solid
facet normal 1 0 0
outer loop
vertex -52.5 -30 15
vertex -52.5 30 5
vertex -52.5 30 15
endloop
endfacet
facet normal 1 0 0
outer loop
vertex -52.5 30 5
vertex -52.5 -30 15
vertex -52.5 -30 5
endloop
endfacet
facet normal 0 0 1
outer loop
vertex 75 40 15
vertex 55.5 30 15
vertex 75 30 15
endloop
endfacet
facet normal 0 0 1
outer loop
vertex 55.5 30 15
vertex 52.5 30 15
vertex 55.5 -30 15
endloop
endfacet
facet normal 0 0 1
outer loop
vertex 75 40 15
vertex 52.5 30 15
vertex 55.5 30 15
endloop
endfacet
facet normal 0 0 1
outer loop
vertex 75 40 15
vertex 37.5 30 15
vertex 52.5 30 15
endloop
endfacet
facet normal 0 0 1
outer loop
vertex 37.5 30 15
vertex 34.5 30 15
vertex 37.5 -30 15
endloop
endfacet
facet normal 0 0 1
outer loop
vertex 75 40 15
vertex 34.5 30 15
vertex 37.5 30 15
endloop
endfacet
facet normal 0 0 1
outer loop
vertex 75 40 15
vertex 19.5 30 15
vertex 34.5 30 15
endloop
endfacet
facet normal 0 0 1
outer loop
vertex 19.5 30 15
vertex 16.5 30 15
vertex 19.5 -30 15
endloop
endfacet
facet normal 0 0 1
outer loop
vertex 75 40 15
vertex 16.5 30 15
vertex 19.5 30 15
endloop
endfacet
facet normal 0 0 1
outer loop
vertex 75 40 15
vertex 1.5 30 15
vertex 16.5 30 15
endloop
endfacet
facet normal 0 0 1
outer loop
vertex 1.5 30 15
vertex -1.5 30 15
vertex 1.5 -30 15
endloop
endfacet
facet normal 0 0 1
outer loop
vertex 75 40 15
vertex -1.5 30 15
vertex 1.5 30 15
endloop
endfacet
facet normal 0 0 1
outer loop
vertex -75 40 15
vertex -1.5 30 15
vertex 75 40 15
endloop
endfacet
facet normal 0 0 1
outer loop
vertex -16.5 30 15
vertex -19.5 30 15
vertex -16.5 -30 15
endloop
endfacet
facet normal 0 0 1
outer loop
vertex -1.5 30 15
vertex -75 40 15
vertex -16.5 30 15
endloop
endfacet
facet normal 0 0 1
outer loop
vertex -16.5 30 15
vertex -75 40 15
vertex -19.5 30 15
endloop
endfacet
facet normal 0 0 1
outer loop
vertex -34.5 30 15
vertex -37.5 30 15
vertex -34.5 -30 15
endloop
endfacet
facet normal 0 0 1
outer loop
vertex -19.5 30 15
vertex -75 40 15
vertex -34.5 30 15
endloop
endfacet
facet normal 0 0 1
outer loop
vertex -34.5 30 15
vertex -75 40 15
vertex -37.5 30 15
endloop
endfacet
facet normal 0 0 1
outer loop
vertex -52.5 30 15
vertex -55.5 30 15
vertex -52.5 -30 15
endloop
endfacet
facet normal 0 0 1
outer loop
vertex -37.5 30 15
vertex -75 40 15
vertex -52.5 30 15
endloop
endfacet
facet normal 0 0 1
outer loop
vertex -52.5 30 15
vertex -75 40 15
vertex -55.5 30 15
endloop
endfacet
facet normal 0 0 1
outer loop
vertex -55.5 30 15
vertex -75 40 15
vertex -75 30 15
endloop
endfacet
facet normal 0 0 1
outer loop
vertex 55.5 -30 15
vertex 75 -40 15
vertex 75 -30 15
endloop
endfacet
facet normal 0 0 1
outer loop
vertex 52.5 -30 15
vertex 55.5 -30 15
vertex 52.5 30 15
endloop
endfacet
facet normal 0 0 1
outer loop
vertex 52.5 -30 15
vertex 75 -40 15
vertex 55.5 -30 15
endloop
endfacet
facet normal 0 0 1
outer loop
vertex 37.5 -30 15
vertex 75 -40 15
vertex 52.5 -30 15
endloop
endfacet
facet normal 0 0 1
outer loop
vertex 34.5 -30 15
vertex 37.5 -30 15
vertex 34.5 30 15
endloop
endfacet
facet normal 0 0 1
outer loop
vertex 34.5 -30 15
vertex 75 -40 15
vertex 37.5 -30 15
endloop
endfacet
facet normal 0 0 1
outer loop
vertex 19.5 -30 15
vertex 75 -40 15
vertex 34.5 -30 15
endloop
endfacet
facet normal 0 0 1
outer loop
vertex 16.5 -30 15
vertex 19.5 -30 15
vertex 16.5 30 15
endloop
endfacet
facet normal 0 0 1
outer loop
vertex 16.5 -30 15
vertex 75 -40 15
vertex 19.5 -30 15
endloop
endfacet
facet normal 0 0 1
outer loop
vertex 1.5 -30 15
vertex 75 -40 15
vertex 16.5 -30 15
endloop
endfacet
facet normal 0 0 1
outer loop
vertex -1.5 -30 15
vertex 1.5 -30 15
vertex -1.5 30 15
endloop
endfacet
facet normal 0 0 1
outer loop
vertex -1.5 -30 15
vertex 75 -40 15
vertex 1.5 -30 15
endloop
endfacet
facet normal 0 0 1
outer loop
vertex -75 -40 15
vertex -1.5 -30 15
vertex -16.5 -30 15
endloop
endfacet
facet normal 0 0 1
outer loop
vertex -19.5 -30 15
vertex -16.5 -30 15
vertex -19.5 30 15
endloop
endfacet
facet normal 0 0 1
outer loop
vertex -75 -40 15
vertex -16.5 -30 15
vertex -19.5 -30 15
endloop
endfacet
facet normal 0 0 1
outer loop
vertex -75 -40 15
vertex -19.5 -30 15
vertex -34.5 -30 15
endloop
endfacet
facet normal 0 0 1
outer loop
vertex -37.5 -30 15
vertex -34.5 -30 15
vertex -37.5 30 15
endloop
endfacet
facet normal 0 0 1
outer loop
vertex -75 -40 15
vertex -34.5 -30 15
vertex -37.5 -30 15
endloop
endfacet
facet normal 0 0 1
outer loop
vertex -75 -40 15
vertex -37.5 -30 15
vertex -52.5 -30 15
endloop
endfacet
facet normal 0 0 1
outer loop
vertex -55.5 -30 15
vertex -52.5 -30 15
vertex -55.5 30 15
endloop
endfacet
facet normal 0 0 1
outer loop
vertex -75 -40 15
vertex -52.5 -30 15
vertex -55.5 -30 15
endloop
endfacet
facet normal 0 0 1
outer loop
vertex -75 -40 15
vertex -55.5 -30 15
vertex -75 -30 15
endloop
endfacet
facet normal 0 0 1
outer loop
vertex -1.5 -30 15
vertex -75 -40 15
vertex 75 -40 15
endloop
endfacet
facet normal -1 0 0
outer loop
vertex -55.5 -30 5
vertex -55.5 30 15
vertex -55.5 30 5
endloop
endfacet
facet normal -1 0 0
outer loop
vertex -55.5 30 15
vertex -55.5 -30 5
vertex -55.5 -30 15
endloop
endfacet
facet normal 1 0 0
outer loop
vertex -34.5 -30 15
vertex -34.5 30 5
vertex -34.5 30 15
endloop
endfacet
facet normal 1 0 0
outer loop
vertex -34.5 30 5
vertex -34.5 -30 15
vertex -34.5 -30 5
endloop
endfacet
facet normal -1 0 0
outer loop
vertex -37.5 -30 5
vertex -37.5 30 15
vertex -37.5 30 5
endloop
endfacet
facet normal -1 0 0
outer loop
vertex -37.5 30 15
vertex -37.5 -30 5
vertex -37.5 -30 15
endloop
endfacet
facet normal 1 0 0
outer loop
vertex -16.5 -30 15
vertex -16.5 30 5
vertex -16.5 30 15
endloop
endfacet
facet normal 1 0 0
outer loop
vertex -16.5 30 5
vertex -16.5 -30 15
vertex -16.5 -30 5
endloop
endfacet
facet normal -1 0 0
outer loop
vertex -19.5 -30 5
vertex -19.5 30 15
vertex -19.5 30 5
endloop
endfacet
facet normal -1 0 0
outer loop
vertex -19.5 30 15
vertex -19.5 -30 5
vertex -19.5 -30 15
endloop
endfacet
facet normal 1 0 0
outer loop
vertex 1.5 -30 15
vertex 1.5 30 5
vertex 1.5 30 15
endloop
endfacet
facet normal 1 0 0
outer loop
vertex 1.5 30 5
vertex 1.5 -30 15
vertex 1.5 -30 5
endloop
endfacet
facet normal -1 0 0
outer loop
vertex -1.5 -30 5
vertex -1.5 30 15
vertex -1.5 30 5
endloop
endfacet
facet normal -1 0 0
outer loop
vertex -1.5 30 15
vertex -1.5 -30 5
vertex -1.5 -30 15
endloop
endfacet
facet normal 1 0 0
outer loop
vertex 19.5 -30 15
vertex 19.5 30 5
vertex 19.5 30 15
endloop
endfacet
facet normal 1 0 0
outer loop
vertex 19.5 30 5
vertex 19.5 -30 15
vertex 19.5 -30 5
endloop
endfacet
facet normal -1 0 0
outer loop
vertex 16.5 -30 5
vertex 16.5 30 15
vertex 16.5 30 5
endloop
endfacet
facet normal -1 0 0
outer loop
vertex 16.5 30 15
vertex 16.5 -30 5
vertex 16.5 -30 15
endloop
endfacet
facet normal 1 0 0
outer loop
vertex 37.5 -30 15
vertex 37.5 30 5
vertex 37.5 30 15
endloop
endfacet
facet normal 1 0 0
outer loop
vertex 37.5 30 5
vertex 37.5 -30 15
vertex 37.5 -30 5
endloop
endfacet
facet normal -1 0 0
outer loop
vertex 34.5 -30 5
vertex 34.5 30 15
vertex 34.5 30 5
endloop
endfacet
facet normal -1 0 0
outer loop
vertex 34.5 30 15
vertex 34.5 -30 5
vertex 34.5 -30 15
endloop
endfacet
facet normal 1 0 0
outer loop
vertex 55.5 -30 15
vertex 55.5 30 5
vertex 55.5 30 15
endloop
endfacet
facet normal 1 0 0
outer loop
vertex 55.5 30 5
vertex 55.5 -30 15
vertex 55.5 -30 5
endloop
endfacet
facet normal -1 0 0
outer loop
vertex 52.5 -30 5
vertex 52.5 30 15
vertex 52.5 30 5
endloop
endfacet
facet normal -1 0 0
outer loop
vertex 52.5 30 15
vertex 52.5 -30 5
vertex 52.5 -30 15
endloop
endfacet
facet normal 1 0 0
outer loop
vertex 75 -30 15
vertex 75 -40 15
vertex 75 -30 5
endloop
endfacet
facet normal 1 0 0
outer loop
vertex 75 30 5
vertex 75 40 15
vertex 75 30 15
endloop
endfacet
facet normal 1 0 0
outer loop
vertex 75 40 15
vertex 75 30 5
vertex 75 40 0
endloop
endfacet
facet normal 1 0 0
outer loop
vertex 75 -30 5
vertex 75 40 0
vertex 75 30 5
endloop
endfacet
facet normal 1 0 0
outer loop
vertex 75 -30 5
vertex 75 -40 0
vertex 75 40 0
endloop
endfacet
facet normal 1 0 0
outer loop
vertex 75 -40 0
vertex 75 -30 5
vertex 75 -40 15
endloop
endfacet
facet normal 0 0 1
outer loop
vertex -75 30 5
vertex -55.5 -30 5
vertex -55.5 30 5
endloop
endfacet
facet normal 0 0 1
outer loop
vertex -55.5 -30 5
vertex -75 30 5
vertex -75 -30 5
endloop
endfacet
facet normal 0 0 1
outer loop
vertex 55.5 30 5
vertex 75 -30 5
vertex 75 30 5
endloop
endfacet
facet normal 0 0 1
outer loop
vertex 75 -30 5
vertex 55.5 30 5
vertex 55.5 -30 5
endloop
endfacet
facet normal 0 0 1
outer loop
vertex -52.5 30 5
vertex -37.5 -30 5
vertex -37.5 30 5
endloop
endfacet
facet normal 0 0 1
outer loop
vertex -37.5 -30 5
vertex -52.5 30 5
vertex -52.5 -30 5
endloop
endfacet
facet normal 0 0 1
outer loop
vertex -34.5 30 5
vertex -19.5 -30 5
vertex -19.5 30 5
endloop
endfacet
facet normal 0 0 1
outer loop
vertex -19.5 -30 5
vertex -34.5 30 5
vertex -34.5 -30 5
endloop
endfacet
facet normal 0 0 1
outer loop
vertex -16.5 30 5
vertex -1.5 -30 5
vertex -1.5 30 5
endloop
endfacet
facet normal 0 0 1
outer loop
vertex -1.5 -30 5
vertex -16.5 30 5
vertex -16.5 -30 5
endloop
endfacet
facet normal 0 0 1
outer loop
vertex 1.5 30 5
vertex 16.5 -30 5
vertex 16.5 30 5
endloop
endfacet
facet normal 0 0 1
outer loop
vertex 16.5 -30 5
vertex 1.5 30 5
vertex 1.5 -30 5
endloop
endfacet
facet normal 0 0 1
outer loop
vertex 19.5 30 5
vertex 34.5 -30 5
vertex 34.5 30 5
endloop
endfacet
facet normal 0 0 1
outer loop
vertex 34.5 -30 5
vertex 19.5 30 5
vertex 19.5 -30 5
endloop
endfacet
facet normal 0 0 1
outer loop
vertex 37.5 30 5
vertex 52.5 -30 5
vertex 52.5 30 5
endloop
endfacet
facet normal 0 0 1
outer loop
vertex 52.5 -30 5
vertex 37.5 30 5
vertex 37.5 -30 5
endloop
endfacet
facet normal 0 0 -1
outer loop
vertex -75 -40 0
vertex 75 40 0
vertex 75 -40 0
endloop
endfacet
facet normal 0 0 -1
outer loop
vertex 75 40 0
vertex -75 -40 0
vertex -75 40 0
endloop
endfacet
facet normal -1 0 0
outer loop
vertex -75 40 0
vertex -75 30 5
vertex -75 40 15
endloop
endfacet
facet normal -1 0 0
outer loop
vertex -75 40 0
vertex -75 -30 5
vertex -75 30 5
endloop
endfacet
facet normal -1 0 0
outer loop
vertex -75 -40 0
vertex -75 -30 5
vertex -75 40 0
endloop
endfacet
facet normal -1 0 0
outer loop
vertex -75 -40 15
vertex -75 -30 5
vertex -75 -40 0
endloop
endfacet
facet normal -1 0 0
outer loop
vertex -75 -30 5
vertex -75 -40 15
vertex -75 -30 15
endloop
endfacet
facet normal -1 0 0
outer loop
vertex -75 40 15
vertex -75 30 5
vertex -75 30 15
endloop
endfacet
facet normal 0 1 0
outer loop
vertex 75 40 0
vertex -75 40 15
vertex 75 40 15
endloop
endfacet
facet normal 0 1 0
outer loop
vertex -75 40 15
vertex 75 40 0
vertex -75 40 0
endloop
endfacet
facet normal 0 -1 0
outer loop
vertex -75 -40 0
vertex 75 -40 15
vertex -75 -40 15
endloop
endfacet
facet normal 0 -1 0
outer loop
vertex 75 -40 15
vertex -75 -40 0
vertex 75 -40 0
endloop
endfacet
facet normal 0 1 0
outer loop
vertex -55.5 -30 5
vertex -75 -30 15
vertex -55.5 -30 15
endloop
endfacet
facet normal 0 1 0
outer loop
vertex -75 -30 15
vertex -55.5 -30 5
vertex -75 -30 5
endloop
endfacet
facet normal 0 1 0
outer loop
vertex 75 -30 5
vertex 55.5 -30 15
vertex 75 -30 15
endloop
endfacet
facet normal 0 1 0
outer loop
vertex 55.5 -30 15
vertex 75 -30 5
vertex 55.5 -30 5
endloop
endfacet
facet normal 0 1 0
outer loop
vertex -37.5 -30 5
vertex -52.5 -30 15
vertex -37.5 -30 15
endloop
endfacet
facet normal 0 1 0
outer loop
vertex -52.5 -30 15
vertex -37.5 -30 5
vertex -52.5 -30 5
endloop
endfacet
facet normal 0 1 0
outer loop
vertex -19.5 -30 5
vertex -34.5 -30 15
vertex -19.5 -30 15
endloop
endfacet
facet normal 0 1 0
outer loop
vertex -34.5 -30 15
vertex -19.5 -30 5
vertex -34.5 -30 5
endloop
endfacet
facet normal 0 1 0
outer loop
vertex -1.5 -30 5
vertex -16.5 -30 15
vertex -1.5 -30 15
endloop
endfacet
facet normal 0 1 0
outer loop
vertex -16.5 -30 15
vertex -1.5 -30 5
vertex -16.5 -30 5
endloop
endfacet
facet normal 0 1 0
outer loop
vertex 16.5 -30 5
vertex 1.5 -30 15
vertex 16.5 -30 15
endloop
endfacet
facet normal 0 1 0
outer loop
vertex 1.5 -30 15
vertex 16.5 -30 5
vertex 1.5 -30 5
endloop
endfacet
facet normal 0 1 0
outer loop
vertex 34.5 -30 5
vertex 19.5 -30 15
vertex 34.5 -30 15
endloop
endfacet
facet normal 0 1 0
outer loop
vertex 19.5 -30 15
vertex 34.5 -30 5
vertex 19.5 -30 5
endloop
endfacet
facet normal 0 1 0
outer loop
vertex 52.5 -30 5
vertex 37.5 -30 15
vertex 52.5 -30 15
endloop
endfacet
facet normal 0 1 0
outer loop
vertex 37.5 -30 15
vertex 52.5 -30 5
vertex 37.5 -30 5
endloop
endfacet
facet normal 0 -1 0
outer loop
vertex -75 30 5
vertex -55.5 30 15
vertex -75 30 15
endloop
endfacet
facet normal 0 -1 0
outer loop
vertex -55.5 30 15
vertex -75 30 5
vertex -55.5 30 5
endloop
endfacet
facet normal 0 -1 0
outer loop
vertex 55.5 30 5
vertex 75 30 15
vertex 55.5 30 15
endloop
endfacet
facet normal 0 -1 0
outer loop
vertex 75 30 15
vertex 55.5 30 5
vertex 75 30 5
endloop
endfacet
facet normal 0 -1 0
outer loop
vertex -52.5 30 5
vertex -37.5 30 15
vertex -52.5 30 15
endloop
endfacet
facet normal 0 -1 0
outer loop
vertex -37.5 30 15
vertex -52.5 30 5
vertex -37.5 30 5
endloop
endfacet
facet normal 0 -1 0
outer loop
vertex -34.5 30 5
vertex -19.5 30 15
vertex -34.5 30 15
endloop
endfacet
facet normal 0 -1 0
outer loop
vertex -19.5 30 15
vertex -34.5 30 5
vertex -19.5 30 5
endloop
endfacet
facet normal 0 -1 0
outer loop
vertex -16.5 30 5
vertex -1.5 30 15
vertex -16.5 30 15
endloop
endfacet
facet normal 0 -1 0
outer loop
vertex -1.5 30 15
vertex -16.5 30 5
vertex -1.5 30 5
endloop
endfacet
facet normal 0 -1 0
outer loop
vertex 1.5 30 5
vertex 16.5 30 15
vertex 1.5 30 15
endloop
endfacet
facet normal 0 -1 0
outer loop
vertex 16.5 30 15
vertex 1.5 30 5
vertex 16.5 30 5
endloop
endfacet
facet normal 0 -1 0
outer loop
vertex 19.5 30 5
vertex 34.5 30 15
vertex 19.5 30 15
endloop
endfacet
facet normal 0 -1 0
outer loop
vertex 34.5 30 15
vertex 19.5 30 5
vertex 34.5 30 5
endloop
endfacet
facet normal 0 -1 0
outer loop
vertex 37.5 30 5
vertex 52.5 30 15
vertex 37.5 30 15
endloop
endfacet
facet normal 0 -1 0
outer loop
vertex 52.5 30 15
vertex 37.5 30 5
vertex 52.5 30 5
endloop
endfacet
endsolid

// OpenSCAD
$fn = 32;

// ----------------------------------------------------------------------
// Rib frame 150 x 80 x 15
// 7 ribs at 18 mm pitch
// ----------------------------------------------------------------------

// --- parameters (mm) ---
frame = [150, 80, 5];  // base plate size (x, y, z)
rail_w = 10;           // side rail width
ribs = 7;              // number of ribs
rib_t = 3;             // rib thickness
rib_h = 10;            // rib height above the base plate
pitch = 18;            // pitch between rib centres

// --- derived feature positions (mm) ---
span = (ribs - 1) * pitch;          // = 108   distance between the outer ribs
origin_x = -span / 2;               // = -54   X of the first rib
rib_len = frame[1] - 2 * rail_w + 2;  // = 62   rib length, 1 mm into each rail
feature_centers = [
  [origin_x + 0 * pitch, 0],
  [origin_x + 1 * pitch, 0],
  [origin_x + 2 * pitch, 0],
  [origin_x + 3 * pitch, 0],
  [origin_x + 4 * pitch, 0],
  [origin_x + 5 * pitch, 0],
  [origin_x + 6 * pitch, 0]
];   // rib centre line, drives the rib loop

// base plate, two side rails, then the ribs read straight off feature_centers
union() {
  translate([-frame[0] / 2, -frame[1] / 2, 0]) cube(frame);
  translate([-frame[0] / 2, -frame[1] / 2, 0]) cube([frame[0], rail_w, frame[2] + rib_h]);
  translate([-frame[0] / 2, frame[1] / 2 - rail_w, 0]) cube([frame[0], rail_w, frame[2] + rib_h]);
  for (centre = feature_centers)
    translate([centre[0] - rib_t / 2, centre[1] - rib_len / 2, frame[2] - 1])
      cube([rib_t, rib_len, rib_h + 1]);
}
